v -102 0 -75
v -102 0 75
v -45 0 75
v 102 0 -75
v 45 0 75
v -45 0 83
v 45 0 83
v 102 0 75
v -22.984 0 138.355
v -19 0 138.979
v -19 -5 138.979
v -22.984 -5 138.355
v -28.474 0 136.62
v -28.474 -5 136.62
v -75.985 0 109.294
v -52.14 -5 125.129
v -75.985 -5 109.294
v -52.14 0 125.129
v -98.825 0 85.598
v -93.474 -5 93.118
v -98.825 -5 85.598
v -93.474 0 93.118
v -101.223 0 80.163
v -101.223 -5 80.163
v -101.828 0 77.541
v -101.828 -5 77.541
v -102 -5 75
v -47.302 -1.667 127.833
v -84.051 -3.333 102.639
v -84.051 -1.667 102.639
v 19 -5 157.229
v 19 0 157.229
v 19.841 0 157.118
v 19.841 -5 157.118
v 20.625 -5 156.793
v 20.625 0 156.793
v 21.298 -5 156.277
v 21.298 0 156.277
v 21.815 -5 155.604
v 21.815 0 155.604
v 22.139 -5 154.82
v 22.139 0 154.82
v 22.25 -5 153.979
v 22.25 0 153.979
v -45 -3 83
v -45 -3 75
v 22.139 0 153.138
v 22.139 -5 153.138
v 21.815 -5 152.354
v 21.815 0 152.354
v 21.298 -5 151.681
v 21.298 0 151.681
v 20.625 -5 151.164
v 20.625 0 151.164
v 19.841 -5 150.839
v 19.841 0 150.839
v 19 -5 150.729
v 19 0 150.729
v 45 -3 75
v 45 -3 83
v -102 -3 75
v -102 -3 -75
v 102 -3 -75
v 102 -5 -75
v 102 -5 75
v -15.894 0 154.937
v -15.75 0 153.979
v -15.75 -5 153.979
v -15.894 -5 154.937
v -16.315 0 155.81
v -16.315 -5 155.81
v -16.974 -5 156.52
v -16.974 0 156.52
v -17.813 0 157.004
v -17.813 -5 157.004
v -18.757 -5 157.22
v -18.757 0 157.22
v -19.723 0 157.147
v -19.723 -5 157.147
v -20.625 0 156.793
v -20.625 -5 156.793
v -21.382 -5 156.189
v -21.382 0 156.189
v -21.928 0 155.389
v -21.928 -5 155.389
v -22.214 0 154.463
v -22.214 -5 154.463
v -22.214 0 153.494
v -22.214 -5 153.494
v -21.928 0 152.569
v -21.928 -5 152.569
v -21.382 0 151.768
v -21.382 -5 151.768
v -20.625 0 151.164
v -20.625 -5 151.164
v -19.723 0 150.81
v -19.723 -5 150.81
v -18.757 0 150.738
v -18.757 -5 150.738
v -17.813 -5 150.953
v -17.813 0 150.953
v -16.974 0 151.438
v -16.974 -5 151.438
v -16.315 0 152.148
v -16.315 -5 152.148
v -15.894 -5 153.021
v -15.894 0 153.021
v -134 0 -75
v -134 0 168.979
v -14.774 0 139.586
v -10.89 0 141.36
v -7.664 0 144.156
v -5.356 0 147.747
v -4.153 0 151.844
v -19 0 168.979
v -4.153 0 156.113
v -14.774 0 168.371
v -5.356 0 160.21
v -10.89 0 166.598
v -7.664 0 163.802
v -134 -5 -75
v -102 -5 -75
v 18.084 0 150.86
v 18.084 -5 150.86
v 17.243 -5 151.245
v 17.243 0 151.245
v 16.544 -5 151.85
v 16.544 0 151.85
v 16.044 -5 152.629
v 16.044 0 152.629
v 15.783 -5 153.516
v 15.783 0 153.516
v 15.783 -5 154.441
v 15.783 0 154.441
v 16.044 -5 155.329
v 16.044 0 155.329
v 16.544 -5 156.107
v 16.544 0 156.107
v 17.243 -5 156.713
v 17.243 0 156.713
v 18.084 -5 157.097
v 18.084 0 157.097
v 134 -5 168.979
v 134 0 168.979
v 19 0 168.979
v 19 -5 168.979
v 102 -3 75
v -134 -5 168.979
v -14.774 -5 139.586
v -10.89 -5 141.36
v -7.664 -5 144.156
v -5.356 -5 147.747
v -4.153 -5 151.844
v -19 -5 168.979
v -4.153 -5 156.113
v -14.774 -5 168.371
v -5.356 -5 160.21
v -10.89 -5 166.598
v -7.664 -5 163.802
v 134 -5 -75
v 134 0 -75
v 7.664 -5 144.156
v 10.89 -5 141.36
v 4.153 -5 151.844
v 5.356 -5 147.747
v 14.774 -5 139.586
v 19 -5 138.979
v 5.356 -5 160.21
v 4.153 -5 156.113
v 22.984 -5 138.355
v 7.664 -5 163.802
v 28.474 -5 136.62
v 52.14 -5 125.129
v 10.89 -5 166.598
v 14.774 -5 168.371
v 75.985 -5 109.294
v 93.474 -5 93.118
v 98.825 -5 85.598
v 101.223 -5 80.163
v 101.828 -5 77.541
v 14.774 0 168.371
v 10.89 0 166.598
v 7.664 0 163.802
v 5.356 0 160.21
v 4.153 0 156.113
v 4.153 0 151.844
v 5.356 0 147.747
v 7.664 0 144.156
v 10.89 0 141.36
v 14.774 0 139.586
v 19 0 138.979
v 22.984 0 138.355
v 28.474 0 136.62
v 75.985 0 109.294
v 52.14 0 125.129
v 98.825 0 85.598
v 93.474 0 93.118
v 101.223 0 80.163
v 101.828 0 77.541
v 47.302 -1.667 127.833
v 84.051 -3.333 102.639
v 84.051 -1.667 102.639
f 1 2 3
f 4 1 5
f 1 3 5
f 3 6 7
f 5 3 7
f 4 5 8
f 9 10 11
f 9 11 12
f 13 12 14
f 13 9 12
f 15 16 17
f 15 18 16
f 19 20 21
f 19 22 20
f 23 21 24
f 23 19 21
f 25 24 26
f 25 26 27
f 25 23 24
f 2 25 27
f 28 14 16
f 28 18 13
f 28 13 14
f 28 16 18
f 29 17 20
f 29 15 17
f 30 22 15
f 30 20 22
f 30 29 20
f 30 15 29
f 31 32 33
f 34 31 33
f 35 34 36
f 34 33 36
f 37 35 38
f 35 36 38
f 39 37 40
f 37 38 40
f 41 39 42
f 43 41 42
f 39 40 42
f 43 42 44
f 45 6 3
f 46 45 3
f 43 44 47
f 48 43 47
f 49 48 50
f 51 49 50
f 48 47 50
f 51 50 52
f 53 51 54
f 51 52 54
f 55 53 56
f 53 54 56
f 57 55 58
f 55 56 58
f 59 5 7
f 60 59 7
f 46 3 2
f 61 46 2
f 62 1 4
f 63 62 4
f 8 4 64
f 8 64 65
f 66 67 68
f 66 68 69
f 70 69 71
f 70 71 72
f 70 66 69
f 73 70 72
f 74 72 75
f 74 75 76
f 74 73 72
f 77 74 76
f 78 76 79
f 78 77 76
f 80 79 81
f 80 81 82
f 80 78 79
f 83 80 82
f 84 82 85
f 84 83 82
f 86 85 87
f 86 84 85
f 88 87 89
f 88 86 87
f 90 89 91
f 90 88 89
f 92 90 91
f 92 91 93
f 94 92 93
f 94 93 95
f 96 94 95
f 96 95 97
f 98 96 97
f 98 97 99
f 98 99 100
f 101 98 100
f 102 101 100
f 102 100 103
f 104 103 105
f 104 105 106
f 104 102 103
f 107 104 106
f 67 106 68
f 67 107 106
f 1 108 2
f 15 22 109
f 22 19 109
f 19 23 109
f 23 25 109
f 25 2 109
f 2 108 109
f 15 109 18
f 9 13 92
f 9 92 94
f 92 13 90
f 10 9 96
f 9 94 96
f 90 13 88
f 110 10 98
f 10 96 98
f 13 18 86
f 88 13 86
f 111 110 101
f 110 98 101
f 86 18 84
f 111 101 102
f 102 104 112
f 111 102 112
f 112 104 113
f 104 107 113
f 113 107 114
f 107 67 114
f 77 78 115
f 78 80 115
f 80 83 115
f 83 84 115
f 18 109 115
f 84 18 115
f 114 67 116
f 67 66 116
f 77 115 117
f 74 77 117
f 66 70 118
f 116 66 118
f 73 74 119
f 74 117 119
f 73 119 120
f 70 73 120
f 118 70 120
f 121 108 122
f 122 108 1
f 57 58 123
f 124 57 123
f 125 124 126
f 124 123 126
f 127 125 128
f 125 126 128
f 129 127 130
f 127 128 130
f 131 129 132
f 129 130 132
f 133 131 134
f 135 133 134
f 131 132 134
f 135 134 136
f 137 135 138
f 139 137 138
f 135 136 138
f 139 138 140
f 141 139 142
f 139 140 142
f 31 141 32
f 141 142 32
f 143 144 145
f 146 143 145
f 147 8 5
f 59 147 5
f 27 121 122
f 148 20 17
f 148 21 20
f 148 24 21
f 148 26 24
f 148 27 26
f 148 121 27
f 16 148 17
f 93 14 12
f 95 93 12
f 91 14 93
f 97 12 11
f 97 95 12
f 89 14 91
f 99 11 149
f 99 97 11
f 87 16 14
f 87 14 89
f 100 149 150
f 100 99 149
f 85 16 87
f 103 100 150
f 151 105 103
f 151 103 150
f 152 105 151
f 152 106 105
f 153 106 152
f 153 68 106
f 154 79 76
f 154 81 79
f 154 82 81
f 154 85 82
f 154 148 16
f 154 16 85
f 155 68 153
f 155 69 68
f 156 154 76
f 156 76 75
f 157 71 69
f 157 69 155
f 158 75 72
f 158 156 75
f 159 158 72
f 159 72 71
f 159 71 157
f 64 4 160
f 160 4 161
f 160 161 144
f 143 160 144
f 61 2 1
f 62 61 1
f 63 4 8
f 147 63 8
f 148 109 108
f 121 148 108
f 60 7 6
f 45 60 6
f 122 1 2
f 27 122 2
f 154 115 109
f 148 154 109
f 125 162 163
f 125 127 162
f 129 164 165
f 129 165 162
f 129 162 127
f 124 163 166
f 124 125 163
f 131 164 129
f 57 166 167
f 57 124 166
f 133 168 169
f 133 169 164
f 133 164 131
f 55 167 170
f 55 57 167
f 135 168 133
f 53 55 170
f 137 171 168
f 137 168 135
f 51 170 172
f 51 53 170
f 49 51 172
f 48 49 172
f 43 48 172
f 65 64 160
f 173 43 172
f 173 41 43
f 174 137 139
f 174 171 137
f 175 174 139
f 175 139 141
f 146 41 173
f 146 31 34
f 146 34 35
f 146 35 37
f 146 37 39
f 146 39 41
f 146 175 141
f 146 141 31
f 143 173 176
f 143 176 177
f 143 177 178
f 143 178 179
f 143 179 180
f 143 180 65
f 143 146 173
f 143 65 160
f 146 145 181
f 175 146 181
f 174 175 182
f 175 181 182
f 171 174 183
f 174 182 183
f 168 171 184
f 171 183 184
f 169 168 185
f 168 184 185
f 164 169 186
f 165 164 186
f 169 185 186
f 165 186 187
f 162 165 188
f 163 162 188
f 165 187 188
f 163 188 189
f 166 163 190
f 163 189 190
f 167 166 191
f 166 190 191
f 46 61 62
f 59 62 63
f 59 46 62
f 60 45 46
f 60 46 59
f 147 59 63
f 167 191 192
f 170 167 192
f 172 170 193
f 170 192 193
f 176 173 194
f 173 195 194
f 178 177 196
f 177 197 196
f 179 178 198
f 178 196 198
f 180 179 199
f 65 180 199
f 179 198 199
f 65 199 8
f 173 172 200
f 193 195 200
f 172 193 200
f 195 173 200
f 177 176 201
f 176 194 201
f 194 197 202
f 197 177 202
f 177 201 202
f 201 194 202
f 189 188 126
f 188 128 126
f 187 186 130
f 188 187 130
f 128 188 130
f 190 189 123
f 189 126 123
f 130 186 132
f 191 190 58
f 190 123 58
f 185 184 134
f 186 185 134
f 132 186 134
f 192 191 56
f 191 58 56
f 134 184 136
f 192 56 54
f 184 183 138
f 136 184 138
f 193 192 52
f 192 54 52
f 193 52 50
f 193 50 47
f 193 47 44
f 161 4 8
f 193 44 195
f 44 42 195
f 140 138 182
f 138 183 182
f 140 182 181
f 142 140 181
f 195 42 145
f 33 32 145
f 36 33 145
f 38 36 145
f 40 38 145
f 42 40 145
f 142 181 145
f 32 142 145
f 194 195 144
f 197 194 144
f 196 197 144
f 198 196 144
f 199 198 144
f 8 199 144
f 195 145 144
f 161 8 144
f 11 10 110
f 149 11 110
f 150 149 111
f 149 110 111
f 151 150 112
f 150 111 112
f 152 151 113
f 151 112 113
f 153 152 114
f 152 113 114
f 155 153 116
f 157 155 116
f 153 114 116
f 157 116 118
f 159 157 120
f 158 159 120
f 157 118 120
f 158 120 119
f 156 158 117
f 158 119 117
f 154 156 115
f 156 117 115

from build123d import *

# Parameters (mm, degrees)
F1_DEPTH = 3
F0_R     = 3.25
F2_DEPTH = 5
F0_W     = 32
F0_H     = 150


# Not quite as in the source:
# - a feature names something its author has since deleted; it is built from what else it names


with BuildPart() as f1:
    # F0 (on Front) → F1 (new body)
    with BuildSketch(Plane.XZ):
        Polygon((-45, 83), (-45, 75), (0, 75), (45, 75), (45, 83), align=None)
        Polygon((-45, 75), (-102, 75), (-102, -75), (102, -75), (102, 75), (45, 75), (0, 75), align=None)
    extrude(amount=F1_DEPTH)


with BuildPart() as f2:
    # F0 (on Front) → F2 (new body)
    with BuildSketch(Plane.XZ):
        Polygon((-104, 75), (-134, 75), (-134, -75), (-102, -75), (-102, 75), align=None)
        with BuildLine():
            Line((-134, 168.9787209958), (-134, 75))
            Line((-134, 75), (-104, 75))
            Line((-104, 75), (-102, 75))
            add(Edge.make_bspline(
                [(-19, 138.9787209958), (-33.9978419072, 138.7242841167), (-102.5319148936, 99.9943406904), (-102, 75)],
                knots=[0, 0, 0, 0, 104.7963584303, 104.7963584303, 104.7963584303, 104.7963584303], degree=3))
            ThreePointArc((-19, 138.9787209958), (-4, 153.9787209958), (-19, 168.9787209958))
            Line((-19, 168.9787209958), (-104, 168.9787209958))
            Line((-104, 168.9787209958), (-134, 168.9787209958))
        make_face()
        with Locations((-19, 153.9787209958)):
            Circle(F0_R, mode=Mode.SUBTRACT)
    extrude(amount=F2_DEPTH)


with BuildPart() as f2b:
    # F0 (on Front) → F2, piece 2 (new body)
    with BuildSketch(Plane.XZ):
        with Locations((118, 0)):
            Rectangle(F0_W, F0_H)
        Polygon((104, 168.9787209958), (102, 75), (134, 75), (134, 168.9787209958), align=None)
        with BuildLine():
            add(Edge.make_bspline(
                [(19, 138.9787209958), (33.9978419072, 138.7242841167), (102.5319148936, 99.9943406904), (102, 75)],
                knots=[0, 0, 0, 0, 104.7963584303, 104.7963584303, 104.7963584303, 104.7963584303], degree=3))
            Line((102, 75), (104, 168.9787209958))
            Line((104, 168.9787209958), (19, 168.9787209958))
            Line((19, 168.9787209958), (19, 157.2287209958))
            ThreePointArc((19, 157.2287209958), (21.2980970389, 156.2768180346), (22.25, 153.9787209958))
            ThreePointArc((22.25, 153.9787209958), (21.2980970389, 151.6806239569), (19, 150.7287209958))
            Line((19, 150.7287209958), (19, 138.9787209958))
        make_face()
        with BuildLine():
            ThreePointArc((19, 168.9787209958), (4, 153.9787209958), (19, 138.9787209958))
            Line((19, 138.9787209958), (19, 150.7287209958))
            ThreePointArc((19, 150.7287209958), (15.75, 153.9787209958), (19, 157.2287209958))
            Line((19, 157.2287209958), (19, 168.9787209958))
        make_face()
    extrude(amount=F2_DEPTH)


solid = Compound([f1.part, f2.part, f2b.part])
